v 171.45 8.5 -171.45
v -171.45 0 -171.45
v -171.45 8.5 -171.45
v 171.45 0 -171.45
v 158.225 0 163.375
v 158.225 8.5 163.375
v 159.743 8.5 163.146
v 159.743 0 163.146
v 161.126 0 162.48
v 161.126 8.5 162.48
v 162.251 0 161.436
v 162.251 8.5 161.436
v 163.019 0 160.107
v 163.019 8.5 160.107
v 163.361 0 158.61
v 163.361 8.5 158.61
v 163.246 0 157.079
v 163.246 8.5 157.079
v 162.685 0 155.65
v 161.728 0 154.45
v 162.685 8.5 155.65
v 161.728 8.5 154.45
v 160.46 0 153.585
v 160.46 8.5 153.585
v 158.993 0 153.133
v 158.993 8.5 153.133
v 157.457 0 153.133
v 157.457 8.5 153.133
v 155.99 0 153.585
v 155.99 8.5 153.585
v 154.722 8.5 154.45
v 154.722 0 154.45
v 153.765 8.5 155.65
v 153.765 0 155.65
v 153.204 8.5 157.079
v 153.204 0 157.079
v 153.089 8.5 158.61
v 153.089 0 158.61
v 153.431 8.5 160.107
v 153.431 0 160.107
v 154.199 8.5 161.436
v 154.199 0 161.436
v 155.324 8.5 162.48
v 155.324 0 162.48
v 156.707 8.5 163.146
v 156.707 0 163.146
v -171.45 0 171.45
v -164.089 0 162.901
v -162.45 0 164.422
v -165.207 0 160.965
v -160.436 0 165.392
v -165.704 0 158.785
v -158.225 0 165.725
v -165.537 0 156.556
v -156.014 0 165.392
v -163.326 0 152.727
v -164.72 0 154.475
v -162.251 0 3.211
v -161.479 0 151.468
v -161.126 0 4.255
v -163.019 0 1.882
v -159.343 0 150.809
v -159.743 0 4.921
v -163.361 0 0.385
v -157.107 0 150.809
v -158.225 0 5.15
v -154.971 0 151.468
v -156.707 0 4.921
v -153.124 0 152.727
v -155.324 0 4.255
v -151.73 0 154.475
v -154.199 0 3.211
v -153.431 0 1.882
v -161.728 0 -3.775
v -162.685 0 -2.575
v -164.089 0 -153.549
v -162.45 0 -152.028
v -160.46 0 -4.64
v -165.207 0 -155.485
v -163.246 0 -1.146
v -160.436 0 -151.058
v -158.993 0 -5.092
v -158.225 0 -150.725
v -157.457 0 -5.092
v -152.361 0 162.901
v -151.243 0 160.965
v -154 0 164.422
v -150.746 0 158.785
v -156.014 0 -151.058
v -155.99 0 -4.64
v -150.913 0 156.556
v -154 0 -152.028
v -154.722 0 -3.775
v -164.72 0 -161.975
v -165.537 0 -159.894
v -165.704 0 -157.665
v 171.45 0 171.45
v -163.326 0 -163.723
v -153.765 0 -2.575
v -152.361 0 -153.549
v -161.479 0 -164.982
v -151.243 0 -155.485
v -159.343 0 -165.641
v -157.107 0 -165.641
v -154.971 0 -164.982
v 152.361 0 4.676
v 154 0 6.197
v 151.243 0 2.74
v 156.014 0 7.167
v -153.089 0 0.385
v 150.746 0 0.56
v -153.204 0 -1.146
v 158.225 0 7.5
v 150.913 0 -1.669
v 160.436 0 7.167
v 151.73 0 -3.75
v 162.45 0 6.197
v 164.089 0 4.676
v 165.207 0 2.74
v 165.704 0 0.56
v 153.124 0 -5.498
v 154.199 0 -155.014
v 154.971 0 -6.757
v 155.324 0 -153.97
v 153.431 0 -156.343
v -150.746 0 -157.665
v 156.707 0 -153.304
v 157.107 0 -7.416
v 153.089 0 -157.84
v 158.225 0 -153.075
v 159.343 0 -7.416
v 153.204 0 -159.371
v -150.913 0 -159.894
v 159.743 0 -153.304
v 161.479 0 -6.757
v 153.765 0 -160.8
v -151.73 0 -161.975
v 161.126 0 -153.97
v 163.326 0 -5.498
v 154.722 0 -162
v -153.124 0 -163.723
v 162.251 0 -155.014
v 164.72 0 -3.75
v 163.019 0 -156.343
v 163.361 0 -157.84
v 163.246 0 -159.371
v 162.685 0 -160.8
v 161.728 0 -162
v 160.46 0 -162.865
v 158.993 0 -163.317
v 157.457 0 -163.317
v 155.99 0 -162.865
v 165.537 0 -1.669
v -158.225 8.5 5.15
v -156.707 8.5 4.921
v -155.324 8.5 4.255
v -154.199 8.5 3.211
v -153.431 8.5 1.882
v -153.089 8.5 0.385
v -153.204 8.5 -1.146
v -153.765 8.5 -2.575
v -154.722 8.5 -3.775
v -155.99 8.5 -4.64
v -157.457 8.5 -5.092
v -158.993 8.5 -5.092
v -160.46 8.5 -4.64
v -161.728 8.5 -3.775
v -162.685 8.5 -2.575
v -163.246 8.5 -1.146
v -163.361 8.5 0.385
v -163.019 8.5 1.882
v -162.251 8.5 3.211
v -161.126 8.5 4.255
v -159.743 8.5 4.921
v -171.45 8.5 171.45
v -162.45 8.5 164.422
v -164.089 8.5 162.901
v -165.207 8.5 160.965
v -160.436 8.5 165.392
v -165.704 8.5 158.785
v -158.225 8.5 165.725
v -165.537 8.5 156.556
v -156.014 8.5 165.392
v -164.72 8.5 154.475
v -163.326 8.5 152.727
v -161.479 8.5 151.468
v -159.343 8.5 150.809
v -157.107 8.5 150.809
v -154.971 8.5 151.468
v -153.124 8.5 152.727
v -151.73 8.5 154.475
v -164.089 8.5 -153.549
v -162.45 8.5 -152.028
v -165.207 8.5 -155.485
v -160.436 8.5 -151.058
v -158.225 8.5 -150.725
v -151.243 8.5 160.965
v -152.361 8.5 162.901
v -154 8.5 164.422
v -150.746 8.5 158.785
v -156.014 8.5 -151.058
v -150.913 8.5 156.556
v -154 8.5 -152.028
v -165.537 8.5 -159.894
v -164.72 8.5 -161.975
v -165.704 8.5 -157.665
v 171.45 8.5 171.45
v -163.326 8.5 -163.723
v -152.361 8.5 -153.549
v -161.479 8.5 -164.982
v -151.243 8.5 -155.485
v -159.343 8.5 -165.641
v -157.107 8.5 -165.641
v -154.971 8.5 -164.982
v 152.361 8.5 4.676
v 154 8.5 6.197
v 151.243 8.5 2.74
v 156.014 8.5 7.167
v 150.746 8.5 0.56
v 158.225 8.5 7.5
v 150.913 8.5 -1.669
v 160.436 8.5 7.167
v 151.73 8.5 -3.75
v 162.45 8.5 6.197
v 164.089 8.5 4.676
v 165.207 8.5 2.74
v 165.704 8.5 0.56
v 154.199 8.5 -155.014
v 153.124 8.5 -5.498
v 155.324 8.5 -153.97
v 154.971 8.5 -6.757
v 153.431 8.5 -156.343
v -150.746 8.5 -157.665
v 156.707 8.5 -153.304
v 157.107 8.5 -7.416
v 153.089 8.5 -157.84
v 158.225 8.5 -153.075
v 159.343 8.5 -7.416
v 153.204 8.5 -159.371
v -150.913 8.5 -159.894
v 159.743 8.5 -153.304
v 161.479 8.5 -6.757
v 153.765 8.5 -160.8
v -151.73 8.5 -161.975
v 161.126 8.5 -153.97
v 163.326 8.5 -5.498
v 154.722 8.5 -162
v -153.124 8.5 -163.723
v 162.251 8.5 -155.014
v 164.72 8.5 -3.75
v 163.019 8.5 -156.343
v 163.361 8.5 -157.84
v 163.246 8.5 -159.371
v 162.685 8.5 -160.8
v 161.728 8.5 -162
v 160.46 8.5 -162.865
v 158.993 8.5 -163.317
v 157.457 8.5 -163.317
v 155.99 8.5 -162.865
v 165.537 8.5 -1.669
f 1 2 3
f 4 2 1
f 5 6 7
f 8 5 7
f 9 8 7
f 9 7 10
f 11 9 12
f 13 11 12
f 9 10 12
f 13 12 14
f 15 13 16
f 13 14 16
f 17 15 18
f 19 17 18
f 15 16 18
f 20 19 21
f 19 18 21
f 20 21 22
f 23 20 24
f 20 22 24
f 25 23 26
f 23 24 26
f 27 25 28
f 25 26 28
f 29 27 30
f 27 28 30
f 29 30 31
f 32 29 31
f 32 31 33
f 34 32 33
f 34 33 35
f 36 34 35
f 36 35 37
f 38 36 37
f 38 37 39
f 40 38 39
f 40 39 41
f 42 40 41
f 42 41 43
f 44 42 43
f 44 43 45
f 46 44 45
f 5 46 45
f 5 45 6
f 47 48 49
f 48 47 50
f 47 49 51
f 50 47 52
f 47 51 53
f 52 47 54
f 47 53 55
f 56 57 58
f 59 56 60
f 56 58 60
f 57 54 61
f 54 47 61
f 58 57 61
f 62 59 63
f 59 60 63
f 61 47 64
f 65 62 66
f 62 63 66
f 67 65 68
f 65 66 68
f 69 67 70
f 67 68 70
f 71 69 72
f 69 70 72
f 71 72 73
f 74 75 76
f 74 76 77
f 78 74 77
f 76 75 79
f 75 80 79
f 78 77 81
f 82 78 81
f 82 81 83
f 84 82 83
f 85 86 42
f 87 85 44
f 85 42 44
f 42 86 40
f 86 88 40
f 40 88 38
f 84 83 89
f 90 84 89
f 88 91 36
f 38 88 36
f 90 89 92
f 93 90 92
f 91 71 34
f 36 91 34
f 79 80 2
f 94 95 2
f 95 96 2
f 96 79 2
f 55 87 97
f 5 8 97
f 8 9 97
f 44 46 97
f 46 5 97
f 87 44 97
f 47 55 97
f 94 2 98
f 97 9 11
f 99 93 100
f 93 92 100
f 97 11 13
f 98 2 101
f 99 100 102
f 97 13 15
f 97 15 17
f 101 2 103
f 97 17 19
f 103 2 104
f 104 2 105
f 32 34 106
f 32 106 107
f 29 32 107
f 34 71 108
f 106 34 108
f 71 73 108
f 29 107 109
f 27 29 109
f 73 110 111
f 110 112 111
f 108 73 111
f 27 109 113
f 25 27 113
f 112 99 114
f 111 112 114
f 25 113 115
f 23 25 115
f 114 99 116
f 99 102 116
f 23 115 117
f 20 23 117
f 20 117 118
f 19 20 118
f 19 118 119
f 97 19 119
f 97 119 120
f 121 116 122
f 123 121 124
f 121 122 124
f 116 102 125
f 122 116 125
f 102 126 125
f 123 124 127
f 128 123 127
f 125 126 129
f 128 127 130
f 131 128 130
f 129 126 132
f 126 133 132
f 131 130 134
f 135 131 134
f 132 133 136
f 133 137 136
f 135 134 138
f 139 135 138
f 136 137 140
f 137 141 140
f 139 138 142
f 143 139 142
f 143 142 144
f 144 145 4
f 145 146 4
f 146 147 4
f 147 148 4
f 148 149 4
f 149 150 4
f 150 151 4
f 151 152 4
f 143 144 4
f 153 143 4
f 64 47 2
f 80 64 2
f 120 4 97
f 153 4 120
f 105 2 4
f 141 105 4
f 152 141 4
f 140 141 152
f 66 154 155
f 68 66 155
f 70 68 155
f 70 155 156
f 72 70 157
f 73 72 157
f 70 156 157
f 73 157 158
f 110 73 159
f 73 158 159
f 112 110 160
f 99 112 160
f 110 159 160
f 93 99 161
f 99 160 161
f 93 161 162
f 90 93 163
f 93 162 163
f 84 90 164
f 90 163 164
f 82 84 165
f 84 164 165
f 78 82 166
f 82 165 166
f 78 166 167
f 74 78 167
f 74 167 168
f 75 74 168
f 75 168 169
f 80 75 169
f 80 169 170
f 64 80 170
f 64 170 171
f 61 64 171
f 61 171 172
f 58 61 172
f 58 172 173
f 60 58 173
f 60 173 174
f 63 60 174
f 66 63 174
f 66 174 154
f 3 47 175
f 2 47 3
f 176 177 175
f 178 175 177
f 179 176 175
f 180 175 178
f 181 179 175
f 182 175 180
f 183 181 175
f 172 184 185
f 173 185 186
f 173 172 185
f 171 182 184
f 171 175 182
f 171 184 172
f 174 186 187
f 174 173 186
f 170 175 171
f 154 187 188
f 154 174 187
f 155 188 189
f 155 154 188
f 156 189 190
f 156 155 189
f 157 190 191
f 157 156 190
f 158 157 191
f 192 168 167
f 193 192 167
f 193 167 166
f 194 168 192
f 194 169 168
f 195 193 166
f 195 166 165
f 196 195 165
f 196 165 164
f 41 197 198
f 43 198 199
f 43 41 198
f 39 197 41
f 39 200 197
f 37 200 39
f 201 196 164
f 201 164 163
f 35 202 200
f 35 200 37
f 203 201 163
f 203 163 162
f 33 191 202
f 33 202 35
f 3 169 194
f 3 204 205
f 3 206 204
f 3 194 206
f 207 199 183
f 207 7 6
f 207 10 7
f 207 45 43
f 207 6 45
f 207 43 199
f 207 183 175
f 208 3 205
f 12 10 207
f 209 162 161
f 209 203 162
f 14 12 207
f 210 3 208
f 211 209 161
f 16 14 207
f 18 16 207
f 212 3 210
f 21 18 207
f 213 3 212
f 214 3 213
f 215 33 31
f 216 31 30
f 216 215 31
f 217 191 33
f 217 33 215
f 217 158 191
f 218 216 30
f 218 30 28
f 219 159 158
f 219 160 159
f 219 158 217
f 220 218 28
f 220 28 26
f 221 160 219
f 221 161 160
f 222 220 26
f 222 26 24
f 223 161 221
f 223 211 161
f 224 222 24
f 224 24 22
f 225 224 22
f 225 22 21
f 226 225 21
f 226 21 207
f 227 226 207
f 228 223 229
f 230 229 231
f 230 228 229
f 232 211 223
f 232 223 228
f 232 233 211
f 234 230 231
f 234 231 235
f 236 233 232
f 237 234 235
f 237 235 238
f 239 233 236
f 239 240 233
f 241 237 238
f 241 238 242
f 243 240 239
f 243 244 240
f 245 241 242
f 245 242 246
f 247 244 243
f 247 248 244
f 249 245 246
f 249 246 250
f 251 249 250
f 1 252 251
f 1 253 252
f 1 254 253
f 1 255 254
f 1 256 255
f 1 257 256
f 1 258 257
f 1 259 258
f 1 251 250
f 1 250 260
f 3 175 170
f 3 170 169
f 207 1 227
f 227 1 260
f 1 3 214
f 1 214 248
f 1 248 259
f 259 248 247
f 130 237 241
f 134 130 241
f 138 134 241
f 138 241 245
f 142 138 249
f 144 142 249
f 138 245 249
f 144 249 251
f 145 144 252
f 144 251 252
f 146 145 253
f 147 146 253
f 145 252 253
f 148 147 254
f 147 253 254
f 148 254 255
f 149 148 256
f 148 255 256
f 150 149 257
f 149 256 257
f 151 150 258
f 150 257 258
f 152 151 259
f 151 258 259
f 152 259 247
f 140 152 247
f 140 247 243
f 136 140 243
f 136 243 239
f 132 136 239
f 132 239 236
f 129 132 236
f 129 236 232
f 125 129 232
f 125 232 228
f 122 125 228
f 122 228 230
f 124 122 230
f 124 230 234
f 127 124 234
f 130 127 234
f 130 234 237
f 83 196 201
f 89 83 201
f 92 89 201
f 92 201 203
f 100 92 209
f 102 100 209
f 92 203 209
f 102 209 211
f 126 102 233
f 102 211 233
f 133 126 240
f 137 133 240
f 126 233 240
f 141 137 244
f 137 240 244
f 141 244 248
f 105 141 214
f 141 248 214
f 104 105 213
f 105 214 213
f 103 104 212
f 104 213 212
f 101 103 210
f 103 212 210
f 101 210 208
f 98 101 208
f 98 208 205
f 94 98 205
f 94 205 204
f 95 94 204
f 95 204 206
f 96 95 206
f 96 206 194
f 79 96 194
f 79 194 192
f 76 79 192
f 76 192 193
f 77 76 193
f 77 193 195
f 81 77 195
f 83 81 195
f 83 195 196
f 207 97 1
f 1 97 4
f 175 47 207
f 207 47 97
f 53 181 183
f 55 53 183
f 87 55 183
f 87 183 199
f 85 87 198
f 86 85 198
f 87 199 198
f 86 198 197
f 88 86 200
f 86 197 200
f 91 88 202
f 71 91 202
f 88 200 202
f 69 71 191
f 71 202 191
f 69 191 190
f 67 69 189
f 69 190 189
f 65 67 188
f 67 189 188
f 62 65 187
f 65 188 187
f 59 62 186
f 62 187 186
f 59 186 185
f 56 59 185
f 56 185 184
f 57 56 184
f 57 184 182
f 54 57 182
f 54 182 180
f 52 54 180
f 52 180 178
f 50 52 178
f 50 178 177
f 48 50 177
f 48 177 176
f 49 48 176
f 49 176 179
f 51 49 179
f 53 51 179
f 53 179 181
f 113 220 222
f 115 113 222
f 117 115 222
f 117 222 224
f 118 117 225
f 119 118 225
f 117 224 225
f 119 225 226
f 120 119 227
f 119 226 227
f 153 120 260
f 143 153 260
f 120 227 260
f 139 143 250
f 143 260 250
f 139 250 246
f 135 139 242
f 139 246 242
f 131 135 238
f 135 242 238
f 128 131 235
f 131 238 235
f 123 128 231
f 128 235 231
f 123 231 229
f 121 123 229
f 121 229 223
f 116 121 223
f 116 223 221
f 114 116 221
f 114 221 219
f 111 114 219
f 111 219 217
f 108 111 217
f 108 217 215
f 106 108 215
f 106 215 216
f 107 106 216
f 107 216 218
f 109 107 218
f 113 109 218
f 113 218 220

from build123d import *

# Parameters (mm, degrees)
SKETCH1_W           = 342.9
SKETCH1_H           = 342.9
BOSS_EXTRUDE1_DEPTH = 8.5
SKETCH2_R           = 4
CUT_EXTRUDE1_DEPTH  = 243.615858921
SKETCH3_R           = 7.5
SKETCH3_R_2         = 5.15
CUT_EXTRUDE3_DEPTH  = 10


with BuildPart() as part:
    # Sketch1 → Boss-Extrude1 (new body)
    with BuildSketch(Plane(origin=(0, 0, 0), x_dir=(1, 0, 0), z_dir=(0, 1, 0))):
        Rectangle(SKETCH1_W, SKETCH1_H)
    extrude(amount=BOSS_EXTRUDE1_DEPTH)

    # Sketch2 → Cut-Extrude1 (cut, through all)
    with BuildSketch(Plane(origin=(0, 8.5, 0), x_dir=(1, 0, 0), z_dir=(0, 1, 0))):
        with Locations(Location((-158.225, 158.225, 0), (0, 0, 270))):
            Circle(SKETCH2_R)
        with Locations(Location((-158.225, 0, 0), (0, 0, 270))):
            Circle(SKETCH2_R)
        with Locations(Location((-158.225, -158.225, 0), (0, 0, 270))):
            Circle(SKETCH2_R)
        with Locations(Location((158.225, 158.225, 0), (0, 0, 270))):
            Circle(SKETCH2_R)
        with Locations(Location((158.225, 0, 0), (0, 0, 270))):
            Circle(SKETCH2_R)
        with Locations(Location((158.225, -158.225, 0), (0, 0, 270))):
            Circle(SKETCH2_R)
    extrude(amount=-CUT_EXTRUDE1_DEPTH, mode=Mode.SUBTRACT)

    # Sketch3 → Cut-Extrude3 (cut)
    with BuildSketch(Plane(origin=(0, 8.5, 0), x_dir=(1, 0, 0), z_dir=(0, 1, 0))):
        with Locations(Location((-158.225, 158.225, 0), (0, 0, 270))):
            Circle(SKETCH3_R)
        with Locations(Location((-158.225, -158.225, 0), (0, 0, 270))):
            Circle(SKETCH3_R)
        with Locations(Location((-158.225, 0, 0), (0, 0, 270))):
            Circle(SKETCH3_R_2)
        with Locations(Location((158.225, 0, 0), (0, 0, 270))):
            Circle(SKETCH3_R)
        with Locations(Location((158.225, 158.225, 0), (0, 0, 270))):
            Circle(SKETCH3_R_2)
        with Locations(Location((158.225, -158.225, 0), (0, 0, 270))):
            Circle(SKETCH3_R_2)
    extrude(amount=-CUT_EXTRUDE3_DEPTH, mode=Mode.SUBTRACT)


solid = part.part
